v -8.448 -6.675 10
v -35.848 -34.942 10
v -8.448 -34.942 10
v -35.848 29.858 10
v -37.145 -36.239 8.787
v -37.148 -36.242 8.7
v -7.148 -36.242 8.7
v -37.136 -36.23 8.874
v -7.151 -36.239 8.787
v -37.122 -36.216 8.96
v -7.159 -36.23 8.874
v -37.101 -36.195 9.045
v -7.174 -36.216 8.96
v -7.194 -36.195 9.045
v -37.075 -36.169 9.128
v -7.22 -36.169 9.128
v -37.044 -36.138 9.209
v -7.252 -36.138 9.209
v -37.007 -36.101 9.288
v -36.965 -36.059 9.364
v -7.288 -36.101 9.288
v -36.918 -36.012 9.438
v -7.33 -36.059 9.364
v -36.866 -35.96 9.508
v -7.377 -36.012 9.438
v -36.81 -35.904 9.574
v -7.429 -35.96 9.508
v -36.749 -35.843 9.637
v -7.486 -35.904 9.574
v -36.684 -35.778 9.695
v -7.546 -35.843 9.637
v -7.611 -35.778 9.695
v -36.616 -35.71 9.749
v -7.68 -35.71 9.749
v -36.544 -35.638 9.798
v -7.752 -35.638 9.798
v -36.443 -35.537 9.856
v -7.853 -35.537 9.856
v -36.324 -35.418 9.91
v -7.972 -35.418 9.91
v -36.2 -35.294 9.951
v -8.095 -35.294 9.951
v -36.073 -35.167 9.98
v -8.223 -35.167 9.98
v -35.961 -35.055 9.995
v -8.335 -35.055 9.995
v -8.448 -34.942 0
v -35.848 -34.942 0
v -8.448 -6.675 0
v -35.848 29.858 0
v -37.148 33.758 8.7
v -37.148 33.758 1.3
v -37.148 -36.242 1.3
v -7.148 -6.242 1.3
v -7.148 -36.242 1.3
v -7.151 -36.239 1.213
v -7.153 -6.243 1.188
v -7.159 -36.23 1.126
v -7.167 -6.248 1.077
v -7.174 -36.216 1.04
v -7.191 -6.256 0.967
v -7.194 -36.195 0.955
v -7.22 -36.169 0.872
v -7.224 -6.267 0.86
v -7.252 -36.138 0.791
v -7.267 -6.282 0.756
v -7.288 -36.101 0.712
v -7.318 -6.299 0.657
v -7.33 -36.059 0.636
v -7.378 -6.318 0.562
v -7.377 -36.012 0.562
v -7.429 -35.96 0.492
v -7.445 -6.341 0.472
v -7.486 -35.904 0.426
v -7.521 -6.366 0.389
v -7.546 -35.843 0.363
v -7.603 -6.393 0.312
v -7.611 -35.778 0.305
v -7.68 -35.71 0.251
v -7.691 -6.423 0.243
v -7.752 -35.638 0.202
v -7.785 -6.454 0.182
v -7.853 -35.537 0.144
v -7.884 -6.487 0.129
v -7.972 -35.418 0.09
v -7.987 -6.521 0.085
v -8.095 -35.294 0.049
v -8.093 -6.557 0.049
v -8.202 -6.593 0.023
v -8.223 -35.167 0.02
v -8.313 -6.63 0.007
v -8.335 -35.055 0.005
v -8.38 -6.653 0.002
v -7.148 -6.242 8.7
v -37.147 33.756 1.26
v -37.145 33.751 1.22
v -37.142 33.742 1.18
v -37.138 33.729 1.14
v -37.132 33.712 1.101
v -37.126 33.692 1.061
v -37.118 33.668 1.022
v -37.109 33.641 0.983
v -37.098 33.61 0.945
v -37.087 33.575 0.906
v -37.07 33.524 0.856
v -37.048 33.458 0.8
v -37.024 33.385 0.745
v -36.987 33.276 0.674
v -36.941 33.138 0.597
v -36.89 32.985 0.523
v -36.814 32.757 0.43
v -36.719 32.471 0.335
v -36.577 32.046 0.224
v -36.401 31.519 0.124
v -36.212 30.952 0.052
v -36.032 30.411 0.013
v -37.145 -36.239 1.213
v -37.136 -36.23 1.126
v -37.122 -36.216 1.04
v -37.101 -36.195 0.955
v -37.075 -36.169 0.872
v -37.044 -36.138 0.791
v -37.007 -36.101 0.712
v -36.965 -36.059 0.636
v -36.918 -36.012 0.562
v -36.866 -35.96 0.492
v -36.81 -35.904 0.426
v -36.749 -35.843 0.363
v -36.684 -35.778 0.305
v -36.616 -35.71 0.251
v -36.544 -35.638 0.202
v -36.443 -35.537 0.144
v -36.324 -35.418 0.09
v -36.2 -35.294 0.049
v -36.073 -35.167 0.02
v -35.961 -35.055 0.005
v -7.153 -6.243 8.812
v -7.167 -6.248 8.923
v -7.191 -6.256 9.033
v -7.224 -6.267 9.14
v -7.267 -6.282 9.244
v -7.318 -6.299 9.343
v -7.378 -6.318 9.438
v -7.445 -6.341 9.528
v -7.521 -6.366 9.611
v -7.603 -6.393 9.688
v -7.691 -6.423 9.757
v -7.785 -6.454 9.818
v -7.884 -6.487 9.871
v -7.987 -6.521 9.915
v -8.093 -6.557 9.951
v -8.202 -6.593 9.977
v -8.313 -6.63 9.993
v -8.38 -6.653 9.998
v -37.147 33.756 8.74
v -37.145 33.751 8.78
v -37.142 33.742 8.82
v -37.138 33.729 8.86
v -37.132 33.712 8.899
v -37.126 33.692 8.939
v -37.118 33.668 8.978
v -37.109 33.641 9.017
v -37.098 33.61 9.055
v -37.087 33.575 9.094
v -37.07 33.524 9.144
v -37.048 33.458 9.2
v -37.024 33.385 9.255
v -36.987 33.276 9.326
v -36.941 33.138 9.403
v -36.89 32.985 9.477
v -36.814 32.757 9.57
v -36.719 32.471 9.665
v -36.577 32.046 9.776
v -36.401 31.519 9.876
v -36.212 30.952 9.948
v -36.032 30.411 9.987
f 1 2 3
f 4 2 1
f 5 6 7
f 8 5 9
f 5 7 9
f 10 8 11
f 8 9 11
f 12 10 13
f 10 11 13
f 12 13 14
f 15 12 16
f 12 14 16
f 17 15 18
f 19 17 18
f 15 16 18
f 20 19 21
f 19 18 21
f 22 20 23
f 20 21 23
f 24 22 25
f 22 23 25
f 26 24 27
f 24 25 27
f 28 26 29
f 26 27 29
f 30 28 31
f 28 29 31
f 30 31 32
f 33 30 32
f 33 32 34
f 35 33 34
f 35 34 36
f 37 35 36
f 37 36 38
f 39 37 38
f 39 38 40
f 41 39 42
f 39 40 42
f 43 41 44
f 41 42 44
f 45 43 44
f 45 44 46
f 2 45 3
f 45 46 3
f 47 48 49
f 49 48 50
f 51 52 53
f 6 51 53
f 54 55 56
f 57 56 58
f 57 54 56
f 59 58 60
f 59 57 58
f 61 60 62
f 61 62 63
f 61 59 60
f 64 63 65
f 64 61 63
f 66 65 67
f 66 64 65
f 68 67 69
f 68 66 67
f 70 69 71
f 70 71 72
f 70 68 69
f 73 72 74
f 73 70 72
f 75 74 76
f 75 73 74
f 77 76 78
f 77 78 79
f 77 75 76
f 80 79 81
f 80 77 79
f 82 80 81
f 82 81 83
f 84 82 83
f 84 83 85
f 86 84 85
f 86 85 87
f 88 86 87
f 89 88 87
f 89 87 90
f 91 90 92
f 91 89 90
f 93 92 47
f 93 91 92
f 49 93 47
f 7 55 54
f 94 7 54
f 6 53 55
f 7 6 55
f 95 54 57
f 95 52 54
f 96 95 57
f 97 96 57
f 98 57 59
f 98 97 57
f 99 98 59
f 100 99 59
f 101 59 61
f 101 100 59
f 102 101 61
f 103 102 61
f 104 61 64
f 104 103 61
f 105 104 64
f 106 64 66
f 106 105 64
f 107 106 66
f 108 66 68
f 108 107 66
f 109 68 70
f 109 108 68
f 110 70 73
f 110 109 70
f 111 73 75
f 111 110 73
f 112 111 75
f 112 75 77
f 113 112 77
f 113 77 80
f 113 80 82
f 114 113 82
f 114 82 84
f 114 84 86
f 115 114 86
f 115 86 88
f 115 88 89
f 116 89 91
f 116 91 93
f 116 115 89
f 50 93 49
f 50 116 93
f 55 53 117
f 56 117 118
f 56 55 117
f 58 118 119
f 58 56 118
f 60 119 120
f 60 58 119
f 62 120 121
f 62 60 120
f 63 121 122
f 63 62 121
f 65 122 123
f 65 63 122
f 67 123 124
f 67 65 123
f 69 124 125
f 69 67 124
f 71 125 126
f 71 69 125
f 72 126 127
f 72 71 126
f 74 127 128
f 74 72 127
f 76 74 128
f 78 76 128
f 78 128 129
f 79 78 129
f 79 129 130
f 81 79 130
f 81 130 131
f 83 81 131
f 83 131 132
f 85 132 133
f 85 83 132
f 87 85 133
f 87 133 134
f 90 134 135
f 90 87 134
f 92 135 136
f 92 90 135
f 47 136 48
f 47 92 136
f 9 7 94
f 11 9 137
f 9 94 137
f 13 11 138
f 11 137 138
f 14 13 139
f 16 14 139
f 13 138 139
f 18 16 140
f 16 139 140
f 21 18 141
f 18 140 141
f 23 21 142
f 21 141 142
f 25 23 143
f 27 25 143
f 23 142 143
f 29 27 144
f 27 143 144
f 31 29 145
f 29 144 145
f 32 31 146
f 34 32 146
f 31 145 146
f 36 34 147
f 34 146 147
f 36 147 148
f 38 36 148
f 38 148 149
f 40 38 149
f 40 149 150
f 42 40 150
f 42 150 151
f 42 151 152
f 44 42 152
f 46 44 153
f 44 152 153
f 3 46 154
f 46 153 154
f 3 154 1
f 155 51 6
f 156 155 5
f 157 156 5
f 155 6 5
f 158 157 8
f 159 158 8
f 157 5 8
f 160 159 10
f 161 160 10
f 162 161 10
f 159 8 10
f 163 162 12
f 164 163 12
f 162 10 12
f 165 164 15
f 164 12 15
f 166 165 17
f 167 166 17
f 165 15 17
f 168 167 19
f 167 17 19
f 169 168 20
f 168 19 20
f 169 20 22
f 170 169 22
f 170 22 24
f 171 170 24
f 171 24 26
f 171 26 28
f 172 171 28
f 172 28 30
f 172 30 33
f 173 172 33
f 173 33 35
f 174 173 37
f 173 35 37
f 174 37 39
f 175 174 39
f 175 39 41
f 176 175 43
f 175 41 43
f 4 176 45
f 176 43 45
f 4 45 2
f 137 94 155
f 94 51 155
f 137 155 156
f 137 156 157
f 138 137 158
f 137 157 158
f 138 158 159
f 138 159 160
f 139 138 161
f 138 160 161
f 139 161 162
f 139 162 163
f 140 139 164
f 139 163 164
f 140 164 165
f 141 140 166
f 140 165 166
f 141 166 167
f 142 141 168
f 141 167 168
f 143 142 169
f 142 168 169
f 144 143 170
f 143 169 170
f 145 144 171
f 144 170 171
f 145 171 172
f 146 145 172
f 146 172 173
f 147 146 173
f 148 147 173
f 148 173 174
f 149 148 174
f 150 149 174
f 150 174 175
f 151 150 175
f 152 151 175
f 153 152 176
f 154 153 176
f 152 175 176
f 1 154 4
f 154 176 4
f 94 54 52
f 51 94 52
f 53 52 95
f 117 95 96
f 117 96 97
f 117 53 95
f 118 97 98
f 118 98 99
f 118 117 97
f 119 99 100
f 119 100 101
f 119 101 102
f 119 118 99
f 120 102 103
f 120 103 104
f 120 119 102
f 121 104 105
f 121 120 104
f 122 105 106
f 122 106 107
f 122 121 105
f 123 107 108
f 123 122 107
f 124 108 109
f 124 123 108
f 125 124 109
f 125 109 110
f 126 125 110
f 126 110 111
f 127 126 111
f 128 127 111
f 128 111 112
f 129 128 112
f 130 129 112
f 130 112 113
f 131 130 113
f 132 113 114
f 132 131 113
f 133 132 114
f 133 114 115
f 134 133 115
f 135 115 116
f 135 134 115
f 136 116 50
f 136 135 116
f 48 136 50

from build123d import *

# Parameters (mm, degrees)
F0_W     = 30
F0_H     = 30
F1_DEPTH = 10
F2_R     = 1.3


with BuildPart() as f1:
    # F0 (on Top) → F1 (new body)
    with BuildSketch(Plane.XY):
        Polygon((-37.147787, 33.758201), (-37.147787, -6.241799), (-7.147787, -6.241799), align=None)
        with Locations((-22.147787, -21.241799)):
            Rectangle(F0_W, F0_H)
    extrude(amount=F1_DEPTH)

    # F2
    f2_edges = [f1.edges().sort_by_distance(p)[0] for p in [
        (-37.147787, -1.241799, 10),
        (-22.147787, 13.758201, 10),
        (-7.147787, -21.241799, 10),
        (-22.147787, -36.241799, 10),
        (-37.147787, -1.241799, 0),
        (-22.147787, 13.758201, 0),
        (-7.147787, -21.241799, 0),
        (-22.147787, -36.241799, 0),
    ]]
    fillet(f2_edges, radius=F2_R)


solid = f1.part
